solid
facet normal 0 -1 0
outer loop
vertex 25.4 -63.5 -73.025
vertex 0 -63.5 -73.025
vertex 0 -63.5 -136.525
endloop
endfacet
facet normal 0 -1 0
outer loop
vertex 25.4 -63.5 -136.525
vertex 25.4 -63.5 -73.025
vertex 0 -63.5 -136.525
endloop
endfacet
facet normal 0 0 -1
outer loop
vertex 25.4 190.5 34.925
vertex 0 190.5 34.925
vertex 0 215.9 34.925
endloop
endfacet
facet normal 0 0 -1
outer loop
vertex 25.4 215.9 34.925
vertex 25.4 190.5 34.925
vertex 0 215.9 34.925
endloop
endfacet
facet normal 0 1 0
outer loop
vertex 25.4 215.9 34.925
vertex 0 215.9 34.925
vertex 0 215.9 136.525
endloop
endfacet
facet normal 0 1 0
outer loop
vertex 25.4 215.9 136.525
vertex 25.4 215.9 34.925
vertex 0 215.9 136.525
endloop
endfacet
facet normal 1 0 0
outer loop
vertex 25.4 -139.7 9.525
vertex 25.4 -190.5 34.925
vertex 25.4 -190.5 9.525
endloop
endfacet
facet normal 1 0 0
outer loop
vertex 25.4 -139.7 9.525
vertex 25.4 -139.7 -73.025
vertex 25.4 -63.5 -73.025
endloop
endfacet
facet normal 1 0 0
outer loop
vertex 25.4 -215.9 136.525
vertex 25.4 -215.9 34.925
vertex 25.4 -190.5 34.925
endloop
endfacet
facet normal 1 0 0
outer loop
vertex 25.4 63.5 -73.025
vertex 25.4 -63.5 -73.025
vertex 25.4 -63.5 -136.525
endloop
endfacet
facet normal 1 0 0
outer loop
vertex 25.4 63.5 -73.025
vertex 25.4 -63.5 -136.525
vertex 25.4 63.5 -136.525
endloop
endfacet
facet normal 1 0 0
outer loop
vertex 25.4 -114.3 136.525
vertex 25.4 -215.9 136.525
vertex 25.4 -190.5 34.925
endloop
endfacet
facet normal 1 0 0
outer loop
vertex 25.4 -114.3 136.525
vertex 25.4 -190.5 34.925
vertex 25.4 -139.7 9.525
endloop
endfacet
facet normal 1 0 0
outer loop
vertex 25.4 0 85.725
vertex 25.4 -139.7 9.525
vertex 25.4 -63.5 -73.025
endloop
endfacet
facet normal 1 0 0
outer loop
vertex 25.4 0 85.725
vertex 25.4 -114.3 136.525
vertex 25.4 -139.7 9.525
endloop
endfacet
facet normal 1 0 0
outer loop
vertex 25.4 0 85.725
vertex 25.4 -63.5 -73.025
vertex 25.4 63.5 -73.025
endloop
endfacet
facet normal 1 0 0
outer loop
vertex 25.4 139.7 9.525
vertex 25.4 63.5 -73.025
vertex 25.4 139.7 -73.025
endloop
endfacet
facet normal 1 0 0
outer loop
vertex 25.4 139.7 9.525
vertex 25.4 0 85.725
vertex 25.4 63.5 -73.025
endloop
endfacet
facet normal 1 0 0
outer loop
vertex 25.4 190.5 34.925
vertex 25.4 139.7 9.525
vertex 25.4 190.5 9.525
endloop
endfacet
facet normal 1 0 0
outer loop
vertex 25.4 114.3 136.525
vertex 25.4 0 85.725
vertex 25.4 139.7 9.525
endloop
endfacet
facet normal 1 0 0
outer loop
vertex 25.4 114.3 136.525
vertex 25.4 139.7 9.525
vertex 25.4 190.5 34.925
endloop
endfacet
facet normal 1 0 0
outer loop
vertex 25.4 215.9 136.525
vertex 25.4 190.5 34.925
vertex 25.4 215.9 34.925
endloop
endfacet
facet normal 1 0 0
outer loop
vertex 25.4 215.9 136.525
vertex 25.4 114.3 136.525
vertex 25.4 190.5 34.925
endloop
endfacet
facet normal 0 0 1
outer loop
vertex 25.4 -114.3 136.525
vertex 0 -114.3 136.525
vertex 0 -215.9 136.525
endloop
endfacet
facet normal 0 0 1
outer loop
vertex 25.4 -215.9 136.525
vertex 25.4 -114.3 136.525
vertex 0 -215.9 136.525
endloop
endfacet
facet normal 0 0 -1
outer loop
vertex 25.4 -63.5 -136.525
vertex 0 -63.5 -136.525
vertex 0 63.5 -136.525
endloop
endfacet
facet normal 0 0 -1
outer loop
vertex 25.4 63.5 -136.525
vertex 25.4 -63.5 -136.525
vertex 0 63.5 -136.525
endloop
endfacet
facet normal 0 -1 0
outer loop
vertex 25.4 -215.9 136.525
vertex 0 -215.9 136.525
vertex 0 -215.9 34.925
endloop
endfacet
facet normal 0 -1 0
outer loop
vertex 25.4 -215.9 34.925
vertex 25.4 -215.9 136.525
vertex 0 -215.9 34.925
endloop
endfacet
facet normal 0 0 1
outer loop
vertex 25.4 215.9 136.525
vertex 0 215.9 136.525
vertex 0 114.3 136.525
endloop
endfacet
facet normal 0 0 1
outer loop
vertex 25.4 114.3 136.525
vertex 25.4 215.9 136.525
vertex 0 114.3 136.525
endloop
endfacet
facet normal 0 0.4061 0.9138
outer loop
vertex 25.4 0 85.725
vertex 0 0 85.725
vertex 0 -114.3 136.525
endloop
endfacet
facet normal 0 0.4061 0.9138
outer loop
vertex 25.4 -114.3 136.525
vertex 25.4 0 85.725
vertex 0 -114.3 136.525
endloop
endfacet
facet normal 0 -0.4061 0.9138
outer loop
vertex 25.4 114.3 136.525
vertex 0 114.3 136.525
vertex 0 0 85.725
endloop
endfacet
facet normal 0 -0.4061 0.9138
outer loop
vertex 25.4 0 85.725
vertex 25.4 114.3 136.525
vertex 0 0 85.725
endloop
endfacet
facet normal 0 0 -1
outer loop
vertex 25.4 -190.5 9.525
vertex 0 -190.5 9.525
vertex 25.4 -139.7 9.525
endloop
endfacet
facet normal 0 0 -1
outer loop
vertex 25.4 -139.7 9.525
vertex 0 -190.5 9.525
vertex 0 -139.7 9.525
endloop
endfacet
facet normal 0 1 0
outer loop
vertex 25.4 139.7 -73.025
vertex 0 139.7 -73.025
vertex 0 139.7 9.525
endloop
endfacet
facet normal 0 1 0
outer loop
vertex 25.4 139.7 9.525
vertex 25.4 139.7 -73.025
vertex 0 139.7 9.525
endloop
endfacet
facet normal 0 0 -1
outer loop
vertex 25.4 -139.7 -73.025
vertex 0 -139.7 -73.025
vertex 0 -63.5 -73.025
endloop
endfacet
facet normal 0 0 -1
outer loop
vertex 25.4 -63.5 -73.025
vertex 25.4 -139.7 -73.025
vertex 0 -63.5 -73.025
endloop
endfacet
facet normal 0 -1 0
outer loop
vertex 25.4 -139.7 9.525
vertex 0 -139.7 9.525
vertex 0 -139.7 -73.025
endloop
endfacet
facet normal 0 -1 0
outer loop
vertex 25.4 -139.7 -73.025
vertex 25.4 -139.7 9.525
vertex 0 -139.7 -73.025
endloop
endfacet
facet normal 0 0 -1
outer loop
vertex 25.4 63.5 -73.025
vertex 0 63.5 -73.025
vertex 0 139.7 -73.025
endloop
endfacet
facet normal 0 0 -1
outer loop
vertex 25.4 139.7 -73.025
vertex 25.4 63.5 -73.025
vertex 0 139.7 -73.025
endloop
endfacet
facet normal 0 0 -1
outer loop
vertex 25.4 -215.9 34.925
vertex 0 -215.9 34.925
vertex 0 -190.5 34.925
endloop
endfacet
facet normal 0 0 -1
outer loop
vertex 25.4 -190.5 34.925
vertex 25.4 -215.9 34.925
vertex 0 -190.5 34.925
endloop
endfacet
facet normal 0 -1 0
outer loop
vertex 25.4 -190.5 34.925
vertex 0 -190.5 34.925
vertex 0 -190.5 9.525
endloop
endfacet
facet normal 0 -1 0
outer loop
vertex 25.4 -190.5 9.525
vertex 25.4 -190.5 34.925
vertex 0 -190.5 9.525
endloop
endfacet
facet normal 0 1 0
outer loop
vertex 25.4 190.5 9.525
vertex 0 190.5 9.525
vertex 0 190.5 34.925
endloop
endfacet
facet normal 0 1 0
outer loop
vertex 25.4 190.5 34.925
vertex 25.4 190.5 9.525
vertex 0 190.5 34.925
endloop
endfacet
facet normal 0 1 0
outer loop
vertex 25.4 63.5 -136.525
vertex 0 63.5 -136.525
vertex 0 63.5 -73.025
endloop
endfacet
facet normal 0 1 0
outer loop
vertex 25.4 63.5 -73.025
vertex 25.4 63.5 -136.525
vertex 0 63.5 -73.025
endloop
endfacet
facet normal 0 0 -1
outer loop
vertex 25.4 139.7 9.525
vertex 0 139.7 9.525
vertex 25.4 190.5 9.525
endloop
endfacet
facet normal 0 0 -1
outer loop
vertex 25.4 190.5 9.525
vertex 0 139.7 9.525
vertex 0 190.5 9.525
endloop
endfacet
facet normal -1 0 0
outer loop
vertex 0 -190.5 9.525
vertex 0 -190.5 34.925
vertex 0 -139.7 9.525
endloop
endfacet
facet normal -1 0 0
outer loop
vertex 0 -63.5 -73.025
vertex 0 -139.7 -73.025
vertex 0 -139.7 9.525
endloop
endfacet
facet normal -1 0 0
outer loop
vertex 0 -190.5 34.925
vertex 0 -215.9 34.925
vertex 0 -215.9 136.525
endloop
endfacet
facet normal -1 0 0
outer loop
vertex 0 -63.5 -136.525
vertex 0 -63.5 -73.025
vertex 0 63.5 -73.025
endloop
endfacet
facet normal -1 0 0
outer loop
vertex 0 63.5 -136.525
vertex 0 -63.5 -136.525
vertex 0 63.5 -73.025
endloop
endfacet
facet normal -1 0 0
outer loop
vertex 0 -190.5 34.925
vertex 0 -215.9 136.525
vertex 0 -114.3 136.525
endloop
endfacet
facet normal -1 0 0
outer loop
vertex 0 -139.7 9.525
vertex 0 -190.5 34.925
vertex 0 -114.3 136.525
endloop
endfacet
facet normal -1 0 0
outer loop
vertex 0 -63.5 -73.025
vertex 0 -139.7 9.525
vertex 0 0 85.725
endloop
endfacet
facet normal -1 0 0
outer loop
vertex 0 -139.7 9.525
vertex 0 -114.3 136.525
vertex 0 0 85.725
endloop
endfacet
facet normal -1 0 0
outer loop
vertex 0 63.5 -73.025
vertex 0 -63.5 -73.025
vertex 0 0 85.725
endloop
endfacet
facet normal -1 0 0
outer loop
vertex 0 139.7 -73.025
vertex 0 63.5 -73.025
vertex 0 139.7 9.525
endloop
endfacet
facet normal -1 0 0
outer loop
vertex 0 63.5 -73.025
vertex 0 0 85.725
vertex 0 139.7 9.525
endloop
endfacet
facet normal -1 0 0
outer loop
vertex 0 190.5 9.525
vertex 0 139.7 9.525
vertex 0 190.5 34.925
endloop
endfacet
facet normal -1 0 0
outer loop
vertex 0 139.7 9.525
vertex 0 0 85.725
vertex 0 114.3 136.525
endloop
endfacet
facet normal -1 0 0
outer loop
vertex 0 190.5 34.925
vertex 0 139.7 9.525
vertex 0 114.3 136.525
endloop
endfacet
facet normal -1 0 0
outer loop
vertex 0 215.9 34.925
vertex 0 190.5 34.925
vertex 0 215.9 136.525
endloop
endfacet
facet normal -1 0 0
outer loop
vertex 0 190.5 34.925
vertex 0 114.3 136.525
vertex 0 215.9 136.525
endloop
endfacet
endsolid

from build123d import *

# Parameters (mm, degrees)
F1_DEPTH = 25.4


with BuildPart() as f1:
    # F0 (on Right) → F1 (new body)
    with BuildSketch(Plane.YZ):
        Polygon((-114.3, 136.525), (-215.9, 136.525), (-215.9, 34.925), (-190.5, 34.925), (-190.5, 9.525), (-139.7, 9.525), (-139.7, -73.025), (-63.5, -73.025), (-63.5, -136.525), (63.5, -136.525), (63.5, -73.025), (139.7, -73.025), (139.7, 9.525), (190.5, 9.525), (190.5, 34.925), (215.9, 34.925), (215.9, 136.525), (114.3, 136.525), (0, 85.725), align=None)
    extrude(amount=F1_DEPTH)


solid = f1.part
